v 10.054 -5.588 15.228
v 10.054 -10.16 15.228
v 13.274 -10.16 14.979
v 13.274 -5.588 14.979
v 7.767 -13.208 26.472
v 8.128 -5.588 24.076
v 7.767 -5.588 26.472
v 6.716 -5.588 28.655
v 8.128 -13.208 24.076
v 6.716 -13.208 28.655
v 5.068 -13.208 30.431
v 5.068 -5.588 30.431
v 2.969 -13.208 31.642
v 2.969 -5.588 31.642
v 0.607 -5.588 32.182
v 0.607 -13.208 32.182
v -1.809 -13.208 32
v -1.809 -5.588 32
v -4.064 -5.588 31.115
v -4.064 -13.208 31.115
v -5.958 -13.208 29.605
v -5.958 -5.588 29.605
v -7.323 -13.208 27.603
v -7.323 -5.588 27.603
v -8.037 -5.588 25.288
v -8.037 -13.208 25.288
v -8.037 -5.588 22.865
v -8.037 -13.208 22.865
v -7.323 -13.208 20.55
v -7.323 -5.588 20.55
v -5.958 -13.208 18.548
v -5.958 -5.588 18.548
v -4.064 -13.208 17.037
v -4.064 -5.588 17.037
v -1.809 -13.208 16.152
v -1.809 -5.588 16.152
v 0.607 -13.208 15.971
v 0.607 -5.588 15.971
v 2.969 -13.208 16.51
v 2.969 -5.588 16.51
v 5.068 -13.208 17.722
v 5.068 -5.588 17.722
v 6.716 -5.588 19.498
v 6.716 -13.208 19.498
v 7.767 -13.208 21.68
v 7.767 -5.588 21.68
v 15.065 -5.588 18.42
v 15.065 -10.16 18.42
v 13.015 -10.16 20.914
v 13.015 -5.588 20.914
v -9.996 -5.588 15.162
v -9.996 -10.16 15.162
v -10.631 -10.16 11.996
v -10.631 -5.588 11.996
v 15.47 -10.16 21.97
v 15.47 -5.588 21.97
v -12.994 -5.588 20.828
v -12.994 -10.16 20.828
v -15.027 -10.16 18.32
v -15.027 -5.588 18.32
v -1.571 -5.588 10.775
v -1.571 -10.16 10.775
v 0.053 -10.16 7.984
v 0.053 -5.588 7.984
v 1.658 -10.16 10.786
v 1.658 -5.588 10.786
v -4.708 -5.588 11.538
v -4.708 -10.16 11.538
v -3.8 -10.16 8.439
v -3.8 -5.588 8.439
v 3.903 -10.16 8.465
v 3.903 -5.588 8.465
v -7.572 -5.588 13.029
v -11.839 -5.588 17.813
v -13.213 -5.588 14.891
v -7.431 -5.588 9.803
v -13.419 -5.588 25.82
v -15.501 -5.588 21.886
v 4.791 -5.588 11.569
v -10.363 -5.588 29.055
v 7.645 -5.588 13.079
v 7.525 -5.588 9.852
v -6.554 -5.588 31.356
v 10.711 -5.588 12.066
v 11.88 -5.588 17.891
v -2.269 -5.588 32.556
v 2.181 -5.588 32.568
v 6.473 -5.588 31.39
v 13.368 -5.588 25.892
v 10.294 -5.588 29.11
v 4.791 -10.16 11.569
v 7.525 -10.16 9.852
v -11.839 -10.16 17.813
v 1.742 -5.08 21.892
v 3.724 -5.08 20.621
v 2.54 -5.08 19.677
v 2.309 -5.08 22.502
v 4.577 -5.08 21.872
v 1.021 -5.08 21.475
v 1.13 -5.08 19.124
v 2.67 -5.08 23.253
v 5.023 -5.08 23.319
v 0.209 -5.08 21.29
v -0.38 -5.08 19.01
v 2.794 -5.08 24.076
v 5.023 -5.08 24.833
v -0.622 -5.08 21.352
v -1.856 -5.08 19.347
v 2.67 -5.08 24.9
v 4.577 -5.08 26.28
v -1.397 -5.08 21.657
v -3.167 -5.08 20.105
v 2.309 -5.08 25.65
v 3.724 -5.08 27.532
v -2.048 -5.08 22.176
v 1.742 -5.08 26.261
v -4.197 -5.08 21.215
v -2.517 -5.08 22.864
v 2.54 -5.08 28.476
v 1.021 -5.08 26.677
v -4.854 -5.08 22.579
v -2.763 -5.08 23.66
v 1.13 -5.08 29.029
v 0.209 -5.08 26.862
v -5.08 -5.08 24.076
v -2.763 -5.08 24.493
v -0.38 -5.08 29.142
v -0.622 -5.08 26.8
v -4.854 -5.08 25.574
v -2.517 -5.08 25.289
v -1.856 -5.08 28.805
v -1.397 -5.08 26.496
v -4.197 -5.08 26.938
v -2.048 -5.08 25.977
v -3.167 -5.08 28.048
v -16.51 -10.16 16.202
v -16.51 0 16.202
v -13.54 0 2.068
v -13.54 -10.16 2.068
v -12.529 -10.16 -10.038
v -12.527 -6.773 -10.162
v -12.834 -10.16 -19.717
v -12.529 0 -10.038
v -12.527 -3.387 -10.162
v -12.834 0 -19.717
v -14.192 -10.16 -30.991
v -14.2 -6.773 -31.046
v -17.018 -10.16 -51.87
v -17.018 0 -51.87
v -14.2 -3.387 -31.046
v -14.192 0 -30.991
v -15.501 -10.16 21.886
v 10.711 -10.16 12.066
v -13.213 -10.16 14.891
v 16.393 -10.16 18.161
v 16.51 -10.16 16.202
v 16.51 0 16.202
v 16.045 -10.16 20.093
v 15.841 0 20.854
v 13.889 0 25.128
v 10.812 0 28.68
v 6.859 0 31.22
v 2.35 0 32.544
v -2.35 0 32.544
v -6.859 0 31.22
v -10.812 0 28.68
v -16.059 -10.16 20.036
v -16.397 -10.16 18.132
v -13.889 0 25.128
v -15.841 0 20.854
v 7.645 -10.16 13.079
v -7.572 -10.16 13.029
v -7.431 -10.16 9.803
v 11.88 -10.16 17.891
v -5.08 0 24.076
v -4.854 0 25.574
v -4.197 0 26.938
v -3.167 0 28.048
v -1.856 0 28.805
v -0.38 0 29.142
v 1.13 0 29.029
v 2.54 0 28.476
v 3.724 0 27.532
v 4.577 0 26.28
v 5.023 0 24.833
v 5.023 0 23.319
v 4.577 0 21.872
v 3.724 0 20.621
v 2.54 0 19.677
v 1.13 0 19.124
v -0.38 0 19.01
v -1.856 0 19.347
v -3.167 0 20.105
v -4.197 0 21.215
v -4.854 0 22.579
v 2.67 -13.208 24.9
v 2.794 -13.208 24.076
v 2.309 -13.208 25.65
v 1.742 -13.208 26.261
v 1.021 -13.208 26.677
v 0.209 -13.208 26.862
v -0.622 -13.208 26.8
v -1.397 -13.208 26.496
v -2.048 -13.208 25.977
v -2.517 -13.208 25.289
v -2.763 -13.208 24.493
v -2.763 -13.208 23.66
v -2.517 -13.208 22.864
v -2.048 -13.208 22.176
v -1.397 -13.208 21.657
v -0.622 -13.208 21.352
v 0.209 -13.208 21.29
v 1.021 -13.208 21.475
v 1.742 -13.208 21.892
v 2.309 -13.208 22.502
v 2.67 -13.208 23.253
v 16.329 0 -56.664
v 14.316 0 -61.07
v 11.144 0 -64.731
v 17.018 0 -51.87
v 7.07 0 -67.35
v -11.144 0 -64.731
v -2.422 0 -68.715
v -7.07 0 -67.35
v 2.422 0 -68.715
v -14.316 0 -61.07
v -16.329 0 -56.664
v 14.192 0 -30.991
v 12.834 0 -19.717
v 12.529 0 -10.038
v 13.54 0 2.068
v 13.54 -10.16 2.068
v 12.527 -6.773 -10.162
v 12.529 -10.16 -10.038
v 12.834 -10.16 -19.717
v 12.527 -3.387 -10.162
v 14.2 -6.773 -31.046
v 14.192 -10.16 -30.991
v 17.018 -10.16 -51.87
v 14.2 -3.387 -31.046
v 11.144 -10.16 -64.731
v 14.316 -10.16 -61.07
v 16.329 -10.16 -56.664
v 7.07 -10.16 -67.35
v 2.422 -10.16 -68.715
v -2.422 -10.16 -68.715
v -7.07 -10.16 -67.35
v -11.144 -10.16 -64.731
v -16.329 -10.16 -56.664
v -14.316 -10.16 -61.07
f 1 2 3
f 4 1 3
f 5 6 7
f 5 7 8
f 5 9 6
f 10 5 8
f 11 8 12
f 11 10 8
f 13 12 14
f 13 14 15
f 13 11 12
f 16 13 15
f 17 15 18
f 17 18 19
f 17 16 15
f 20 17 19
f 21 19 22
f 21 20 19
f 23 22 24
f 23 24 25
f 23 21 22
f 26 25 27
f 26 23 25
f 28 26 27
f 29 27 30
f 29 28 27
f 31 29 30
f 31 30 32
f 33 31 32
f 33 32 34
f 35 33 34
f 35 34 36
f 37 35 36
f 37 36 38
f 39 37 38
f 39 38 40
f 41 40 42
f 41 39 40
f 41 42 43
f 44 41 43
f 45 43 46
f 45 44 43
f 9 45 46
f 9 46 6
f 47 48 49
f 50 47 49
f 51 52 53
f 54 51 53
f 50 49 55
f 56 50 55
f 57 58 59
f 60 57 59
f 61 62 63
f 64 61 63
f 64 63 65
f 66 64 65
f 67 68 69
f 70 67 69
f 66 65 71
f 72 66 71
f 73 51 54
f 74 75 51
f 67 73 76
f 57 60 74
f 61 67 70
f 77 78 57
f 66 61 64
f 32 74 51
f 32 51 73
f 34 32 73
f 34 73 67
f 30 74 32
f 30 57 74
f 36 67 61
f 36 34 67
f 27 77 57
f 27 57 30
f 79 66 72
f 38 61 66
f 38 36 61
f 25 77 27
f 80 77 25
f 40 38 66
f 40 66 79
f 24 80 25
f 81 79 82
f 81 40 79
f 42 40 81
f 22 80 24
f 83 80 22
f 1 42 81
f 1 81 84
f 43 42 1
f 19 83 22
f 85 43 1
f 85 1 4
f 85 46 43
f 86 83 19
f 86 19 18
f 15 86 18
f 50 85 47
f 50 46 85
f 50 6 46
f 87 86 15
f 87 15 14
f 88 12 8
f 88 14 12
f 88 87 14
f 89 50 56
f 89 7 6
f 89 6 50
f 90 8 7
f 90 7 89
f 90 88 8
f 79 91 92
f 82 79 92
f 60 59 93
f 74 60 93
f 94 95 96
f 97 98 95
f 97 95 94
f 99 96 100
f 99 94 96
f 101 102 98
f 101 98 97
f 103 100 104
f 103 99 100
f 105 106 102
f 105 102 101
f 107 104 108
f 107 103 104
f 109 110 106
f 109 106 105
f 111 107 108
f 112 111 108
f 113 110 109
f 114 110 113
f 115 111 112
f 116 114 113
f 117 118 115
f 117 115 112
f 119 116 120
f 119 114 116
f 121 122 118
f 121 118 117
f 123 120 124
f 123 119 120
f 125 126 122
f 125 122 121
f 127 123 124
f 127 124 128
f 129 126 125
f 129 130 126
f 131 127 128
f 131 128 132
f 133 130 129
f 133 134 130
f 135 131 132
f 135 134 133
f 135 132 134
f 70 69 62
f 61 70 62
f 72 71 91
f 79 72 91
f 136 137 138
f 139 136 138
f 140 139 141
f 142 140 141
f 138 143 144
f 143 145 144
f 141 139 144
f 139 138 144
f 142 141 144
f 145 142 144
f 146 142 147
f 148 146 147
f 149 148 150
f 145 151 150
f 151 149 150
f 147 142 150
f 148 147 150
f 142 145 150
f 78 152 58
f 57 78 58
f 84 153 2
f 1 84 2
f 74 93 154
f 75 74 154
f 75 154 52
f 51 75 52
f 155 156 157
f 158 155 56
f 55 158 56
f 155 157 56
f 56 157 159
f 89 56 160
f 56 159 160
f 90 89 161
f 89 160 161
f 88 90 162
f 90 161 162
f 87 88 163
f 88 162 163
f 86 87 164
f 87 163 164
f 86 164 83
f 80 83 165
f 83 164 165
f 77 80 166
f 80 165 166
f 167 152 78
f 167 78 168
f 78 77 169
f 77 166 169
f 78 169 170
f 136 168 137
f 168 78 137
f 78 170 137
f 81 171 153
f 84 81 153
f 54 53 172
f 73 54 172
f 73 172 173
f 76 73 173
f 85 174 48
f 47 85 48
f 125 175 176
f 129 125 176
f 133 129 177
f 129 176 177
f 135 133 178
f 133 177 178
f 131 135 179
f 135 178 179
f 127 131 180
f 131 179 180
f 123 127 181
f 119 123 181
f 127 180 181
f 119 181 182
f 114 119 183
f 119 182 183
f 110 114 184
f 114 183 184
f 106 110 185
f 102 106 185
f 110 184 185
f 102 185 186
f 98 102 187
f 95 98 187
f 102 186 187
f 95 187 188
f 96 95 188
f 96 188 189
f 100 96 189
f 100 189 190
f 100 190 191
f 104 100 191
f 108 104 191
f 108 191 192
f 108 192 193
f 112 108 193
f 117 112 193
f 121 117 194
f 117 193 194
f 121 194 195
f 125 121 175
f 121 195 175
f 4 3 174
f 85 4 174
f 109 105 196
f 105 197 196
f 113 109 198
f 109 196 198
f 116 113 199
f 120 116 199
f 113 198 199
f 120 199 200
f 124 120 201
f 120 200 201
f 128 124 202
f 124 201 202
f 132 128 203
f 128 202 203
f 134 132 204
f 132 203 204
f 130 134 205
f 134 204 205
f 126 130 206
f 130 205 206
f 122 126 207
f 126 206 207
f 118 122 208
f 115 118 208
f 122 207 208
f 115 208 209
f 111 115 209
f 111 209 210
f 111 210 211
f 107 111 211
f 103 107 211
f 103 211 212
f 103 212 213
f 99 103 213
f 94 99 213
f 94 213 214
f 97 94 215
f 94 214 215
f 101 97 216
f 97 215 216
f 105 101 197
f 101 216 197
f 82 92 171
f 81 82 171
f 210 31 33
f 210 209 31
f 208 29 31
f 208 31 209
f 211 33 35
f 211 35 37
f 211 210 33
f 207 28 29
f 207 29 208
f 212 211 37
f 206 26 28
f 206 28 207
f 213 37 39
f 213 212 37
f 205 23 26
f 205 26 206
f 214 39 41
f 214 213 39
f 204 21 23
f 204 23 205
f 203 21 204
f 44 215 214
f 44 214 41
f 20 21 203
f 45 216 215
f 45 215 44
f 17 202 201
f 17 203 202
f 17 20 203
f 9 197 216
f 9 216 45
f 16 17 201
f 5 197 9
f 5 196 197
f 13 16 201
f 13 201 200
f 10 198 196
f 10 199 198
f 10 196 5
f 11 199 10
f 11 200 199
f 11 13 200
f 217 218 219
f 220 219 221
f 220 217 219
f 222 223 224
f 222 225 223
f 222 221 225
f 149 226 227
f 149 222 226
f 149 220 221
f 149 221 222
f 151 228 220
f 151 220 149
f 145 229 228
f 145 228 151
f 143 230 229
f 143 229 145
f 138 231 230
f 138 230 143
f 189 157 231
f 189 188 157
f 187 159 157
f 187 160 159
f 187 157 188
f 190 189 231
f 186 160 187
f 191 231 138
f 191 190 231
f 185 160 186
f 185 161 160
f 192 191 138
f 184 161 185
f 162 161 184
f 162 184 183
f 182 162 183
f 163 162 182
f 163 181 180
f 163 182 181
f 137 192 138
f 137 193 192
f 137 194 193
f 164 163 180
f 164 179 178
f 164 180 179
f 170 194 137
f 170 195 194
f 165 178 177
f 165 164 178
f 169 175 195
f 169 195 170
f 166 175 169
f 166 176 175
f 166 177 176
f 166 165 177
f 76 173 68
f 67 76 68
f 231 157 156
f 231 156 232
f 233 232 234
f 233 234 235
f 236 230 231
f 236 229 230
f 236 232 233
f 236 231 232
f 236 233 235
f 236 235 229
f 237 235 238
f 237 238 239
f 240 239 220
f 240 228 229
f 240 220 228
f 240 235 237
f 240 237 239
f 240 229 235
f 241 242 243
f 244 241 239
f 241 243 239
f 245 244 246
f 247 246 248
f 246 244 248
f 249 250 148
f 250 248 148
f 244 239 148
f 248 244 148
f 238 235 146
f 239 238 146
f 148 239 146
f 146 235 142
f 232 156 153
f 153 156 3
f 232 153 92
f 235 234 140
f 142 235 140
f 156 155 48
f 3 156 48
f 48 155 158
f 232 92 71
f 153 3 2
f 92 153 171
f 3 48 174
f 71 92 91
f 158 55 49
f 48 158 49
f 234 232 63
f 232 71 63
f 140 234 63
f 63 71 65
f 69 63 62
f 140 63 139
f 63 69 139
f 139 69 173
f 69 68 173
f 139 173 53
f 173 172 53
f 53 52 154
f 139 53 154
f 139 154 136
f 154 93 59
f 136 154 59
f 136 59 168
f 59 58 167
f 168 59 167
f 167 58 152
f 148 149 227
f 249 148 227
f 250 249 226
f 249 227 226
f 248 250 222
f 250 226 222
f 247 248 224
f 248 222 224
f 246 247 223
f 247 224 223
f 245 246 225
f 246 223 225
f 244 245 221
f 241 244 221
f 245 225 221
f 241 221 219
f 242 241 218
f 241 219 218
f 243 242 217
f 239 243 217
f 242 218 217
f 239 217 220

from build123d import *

# Parameters (mm, degrees)
F1_DEPTH = 10.16
F2_R     = 8.128
F2_R_2   = 2.794
F3_DEPTH = 3.048
F4_DEPTH = 50.8
F5_R     = 8.128
F6_DEPTH = 4.572
F7_R     = 5.08
F7_R_2   = 2.794
F8_DEPTH = 5.08


with BuildPart() as f1:
    # F0 (on Front) → F1 (new body)
    with BuildSketch(Plane.XZ):
        with BuildLine():
            add(Edge.make_bspline(
                [(16.51, 16.2022389048), (8.1950903917, -14.7107664531), (15.1309384414, -29.2677398155), (17.018, -51.8697610952)],
                knots=[0, 0, 0, 0, 68.073895496, 68.073895496, 68.073895496, 68.073895496], degree=3))
            ThreePointArc((16.51, 16.2022389048), (0, 32.7122389048), (-16.51, 16.2022389048))
            add(Edge.make_bspline(
                [(-16.51, 16.2022389048), (-8.1950903917, -14.7107664531), (-15.1309384414, -29.2677398155), (-17.018, -51.8697610952)],
                knots=[0, 0, 0, 0, 68.073895496, 68.073895496, 68.073895496, 68.073895496], degree=3))
            ThreePointArc((-17.018, -51.8697610952), (0, -68.8877610952), (17.018, -51.8697610952))
        make_face()
    extrude(amount=F1_DEPTH)

    # F2 (on face) → F3 (join)
    with BuildSketch(Plane.XZ.offset(10.16)):
        with Locations((0, 24.0762389048)):
            Circle(F2_R)
        with Locations((0, 24.0762389048)):
            Circle(F2_R_2, mode=Mode.SUBTRACT)
    extrude(amount=F3_DEPTH)

    # F4 (cut, symmetric): a face of the model
    f4_faces = [f1.faces().sort_by_distance(p)[0] for p in [
        (0, -10.16, 24.0762389048),
    ]]
    extrude(f4_faces, amount=F4_DEPTH, both=True, mode=Mode.SUBTRACT)

    # F5 (on face) → F6 (cut)
    with BuildSketch(Plane.XZ.offset(10.16)):
        with BuildLine():
            ThreePointArc((15.469928865, 21.9695087018), (-0.0442530739, 32.7121795972), (-15.5006234178, 21.8864955545))
            Line((-15.5006234178, 21.8864955545), (-12.9936152173, 20.8281131752))
            Line((-12.9936152173, 20.8281131752), (-15.0273981388, 18.3203464733))
            Line((-15.0273981388, 18.3203464733), (-11.8387170074, 17.8129221485))
            Line((-11.8387170074, 17.8129221485), (-13.2132540393, 14.8913104783))
            Line((-13.2132540393, 14.8913104783), (-9.995795597, 15.1617323254))
            Line((-9.995795597, 15.1617323254), (-10.6312036432, 11.9960691377))
            Line((-10.6312036432, 11.9960691377), (-7.5719548797, 13.0286212217))
            Line((-7.5719548797, 13.0286212217), (-7.4313063342, 9.8028833542))
            Line((-7.4313063342, 9.8028833542), (-4.7080596678, 11.5375575014))
            Line((-4.7080596678, 11.5375575014), (-3.7995285128, 8.4392131139))
            Line((-3.7995285128, 8.4392131139), (-1.570549141, 10.7751963679))
            Line((-1.570549141, 10.7751963679), (0.0530640951, 7.9843099742))
            Line((0.0530640951, 7.9843099742), (1.6582359931, 10.7858434794))
            Line((1.6582359931, 10.7858434794), (3.9025728106, 8.4646112522))
            Line((3.9025728106, 8.4646112522), (4.7906504787, 11.5688800644))
            Line((4.7906504787, 11.5688800644), (7.5252781797, 9.8522035834))
            Line((7.5252781797, 9.8522035834), (7.6446497718, 13.0787988828))
            Line((7.6446497718, 13.0787988828), (10.7106417342, 12.0664451452))
            Line((10.7106417342, 12.0664451452), (10.0543698074, 15.2278489412))
            Line((10.0543698074, 15.2278489412), (13.2735417227, 14.9786522665))
            Line((13.2735417227, 14.9786522665), (11.8797664159, 17.8911352617))
            Line((11.8797664159, 17.8911352617), (15.0650317137, 18.4195780548))
            Line((15.0650317137, 18.4195780548), (13.0147541814, 20.913877324))
            Line((13.0147541814, 20.913877324), (15.469928865, 21.9695087018))
        make_face()
        with BuildLine():
            Line((-11.7664292563, 17.8014187834), (-11.8387170074, 17.8129221485))
            Line((-11.8387170074, 17.8129221485), (-11.8075561021, 17.8791554056))
            ThreePointArc((-11.8075561021, 17.8791554056), (-11.7870567643, 17.84025319), (-11.7664292563, 17.8014187834))
        make_face(mode=Mode.SUBTRACT)
        with BuildLine():
            Line((-9.9228554611, 15.1678628183), (-9.995795597, 15.1617323254))
            Line((-9.995795597, 15.1617323254), (-9.9813908269, 15.2334982572))
            ThreePointArc((-9.9813908269, 15.2334982572), (-9.952177253, 15.2006322819), (-9.9228554611, 15.1678628183))
        make_face(mode=Mode.SUBTRACT)
        with BuildLine():
            Line((-12.9261809524, 20.7996444858), (-12.9936152173, 20.8281131752))
            Line((-12.9936152173, 20.8281131752), (-12.9475091354, 20.8849645215))
            ThreePointArc((-12.9475091354, 20.8849645215), (-12.9369153807, 20.842286921), (-12.9261809524, 20.7996444858))
        make_face(mode=Mode.SUBTRACT)
        with BuildLine():
            Line((-7.5026013746, 13.0520292908), (-7.5719548797, 13.0286212217))
            Line((-7.5719548797, 13.0286212217), (-7.5751433977, 13.1017490531))
            ThreePointArc((-7.5751433977, 13.1017490531), (-7.5389133745, 13.0768293692), (-7.5026013746, 13.0520292908))
        make_face(mode=Mode.SUBTRACT)
        with BuildLine():
            Line((-4.646323367, 11.5768827546), (-4.7080596678, 11.5375575014))
            Line((-4.7080596678, 11.5375575014), (-4.7286561687, 11.6077973086))
            ThreePointArc((-4.7286561687, 11.6077973086), (-4.6875152535, 11.5922721575), (-4.646323367, 11.5768827546))
        make_face(mode=Mode.SUBTRACT)
        with BuildLine():
            Line((-1.5200179341, 10.8281533646), (-1.570549141, 10.7751963679))
            Line((-1.570549141, 10.7751963679), (-1.6073566312, 10.8384660687))
            ThreePointArc((-1.6073566312, 10.8384660687), (-1.5636957843, 10.8332377157), (-1.5200179341, 10.8281533646))
        make_face(mode=Mode.SUBTRACT)
        with BuildLine():
            Line((1.6946254161, 10.8493545514), (1.6582359931, 10.7858434794))
            Line((1.6582359931, 10.7858434794), (1.6073566312, 10.8384660687))
            ThreePointArc((1.6073566312, 10.8384660687), (1.651, 10.8438383667), (1.6946254161, 10.8493545514))
        make_face(mode=Mode.SUBTRACT)
        with BuildLine():
            Line((4.8107832969, 11.639254179), (4.7906504787, 11.5688800644))
            Line((4.7906504787, 11.5688800644), (4.7286561687, 11.6077973086))
            ThreePointArc((4.7286561687, 11.6077973086), (4.7697456655, 11.6234580392), (4.8107832969, 11.639254179))
        make_face(mode=Mode.SUBTRACT)
        with BuildLine():
            Line((7.6473559389, 13.1519461522), (7.6446497718, 13.0787988828))
            Line((7.6446497718, 13.0787988828), (7.5751433977, 13.1017490531))
            ThreePointArc((7.5751433977, 13.1017490531), (7.6112910502, 13.1267880715), (7.6473559389, 13.1519461522))
        make_face(mode=Mode.SUBTRACT)
        with Locations((0, 24.0762389048)):
            Circle(F5_R, mode=Mode.SUBTRACT)
        with BuildLine():
            Line((11.8481693767, 17.9571615707), (11.8797664159, 17.8911352617))
            Line((11.8797664159, 17.8911352617), (11.8075561021, 17.8791554056))
            ThreePointArc((11.8075561021, 17.8791554056), (11.8279270467, 17.9181250071), (11.8481693767, 17.9571615707))
        make_face(mode=Mode.SUBTRACT)
        with BuildLine():
            Line((12.9682741648, 20.9704233621), (13.0147541814, 20.913877324))
            Line((13.0147541814, 20.913877324), (12.9475091354, 20.8849645215))
            ThreePointArc((12.9475091354, 20.8849645215), (12.9579621013, 20.9276768234), (12.9682741648, 20.9704233621))
        make_face(mode=Mode.SUBTRACT)
        with BuildLine():
            Line((-12.9475091354, 20.8849645215), (-12.9936152173, 20.8281131752))
            Line((-12.9936152173, 20.8281131752), (-12.9261809524, 20.7996444858))
            ThreePointArc((-12.9261809524, 20.7996444858), (-12.9369153807, 20.842286921), (-12.9475091354, 20.8849645215))
        make_face()
        with BuildLine():
            Line((-11.8075561021, 17.8791554056), (-11.8387170074, 17.8129221485))
            Line((-11.8387170074, 17.8129221485), (-11.7664292563, 17.8014187834))
            ThreePointArc((-11.7664292563, 17.8014187834), (-11.7870567643, 17.84025319), (-11.8075561021, 17.8791554056))
        make_face()
        with BuildLine():
            Line((-9.9813908269, 15.2334982572), (-9.995795597, 15.1617323254))
            Line((-9.995795597, 15.1617323254), (-9.9228554611, 15.1678628183))
            ThreePointArc((-9.9228554611, 15.1678628183), (-9.952177253, 15.2006322819), (-9.9813908269, 15.2334982572))
        make_face()
        with BuildLine():
            Line((-7.5751433977, 13.1017490531), (-7.5719548797, 13.0286212217))
            Line((-7.5719548797, 13.0286212217), (-7.5026013746, 13.0520292908))
            ThreePointArc((-7.5026013746, 13.0520292908), (-7.5389133745, 13.0768293692), (-7.5751433977, 13.1017490531))
        make_face()
        with BuildLine():
            Line((-4.7286561687, 11.6077973086), (-4.7080596678, 11.5375575014))
            Line((-4.7080596678, 11.5375575014), (-4.646323367, 11.5768827546))
            ThreePointArc((-4.646323367, 11.5768827546), (-4.6875152535, 11.5922721575), (-4.7286561687, 11.6077973086))
        make_face()
        with BuildLine():
            Line((-1.6073566312, 10.8384660687), (-1.570549141, 10.7751963679))
            Line((-1.570549141, 10.7751963679), (-1.5200179341, 10.8281533646))
            ThreePointArc((-1.5200179341, 10.8281533646), (-1.5636957843, 10.8332377157), (-1.6073566312, 10.8384660687))
        make_face()
        with BuildLine():
            Line((1.6073566312, 10.8384660687), (1.6582359931, 10.7858434794))
            Line((1.6582359931, 10.7858434794), (1.6946254161, 10.8493545514))
            ThreePointArc((1.6946254161, 10.8493545514), (1.651, 10.8438383667), (1.6073566312, 10.8384660687))
        make_face()
        with BuildLine():
            Line((4.7286561687, 11.6077973086), (4.7906504787, 11.5688800644))
            Line((4.7906504787, 11.5688800644), (4.8107832969, 11.639254179))
            ThreePointArc((4.8107832969, 11.639254179), (4.7697456655, 11.6234580392), (4.7286561687, 11.6077973086))
        make_face()
        with BuildLine():
            Line((7.5751433977, 13.1017490531), (7.6446497718, 13.0787988828))
            Line((7.6446497718, 13.0787988828), (7.6473559389, 13.1519461522))
            ThreePointArc((7.6473559389, 13.1519461522), (7.6112910502, 13.1267880715), (7.5751433977, 13.1017490531))
        make_face()
        with BuildLine():
            Line((11.8075561021, 17.8791554056), (11.8797664159, 17.8911352617))
            Line((11.8797664159, 17.8911352617), (11.8481693767, 17.9571615707))
            ThreePointArc((11.8481693767, 17.9571615707), (11.8279270467, 17.9181250071), (11.8075561021, 17.8791554056))
        make_face()
        with BuildLine():
            Line((12.9475091354, 20.8849645215), (13.0147541814, 20.913877324))
            Line((13.0147541814, 20.913877324), (12.9682741648, 20.9704233621))
            ThreePointArc((12.9682741648, 20.9704233621), (12.9579621013, 20.9276768234), (12.9475091354, 20.8849645215))
        make_face()
    extrude(amount=-F6_DEPTH, mode=Mode.SUBTRACT)

    # F7 (on face) → F8 (cut)
    with BuildSketch(Plane(origin=(0, 0, 0), x_dir=(-1, 0, 0), z_dir=(0, 1, 0))):
        with Locations((0, 24.0762389048)):
            Circle(F7_R)
        with Locations((0, 24.0762389048)):
            Circle(F7_R_2, mode=Mode.SUBTRACT)
        with Locations((0, 24.0762389048)):
            Circle(F7_R_2)
    extrude(amount=-F8_DEPTH, mode=Mode.SUBTRACT)


solid = f1.part
